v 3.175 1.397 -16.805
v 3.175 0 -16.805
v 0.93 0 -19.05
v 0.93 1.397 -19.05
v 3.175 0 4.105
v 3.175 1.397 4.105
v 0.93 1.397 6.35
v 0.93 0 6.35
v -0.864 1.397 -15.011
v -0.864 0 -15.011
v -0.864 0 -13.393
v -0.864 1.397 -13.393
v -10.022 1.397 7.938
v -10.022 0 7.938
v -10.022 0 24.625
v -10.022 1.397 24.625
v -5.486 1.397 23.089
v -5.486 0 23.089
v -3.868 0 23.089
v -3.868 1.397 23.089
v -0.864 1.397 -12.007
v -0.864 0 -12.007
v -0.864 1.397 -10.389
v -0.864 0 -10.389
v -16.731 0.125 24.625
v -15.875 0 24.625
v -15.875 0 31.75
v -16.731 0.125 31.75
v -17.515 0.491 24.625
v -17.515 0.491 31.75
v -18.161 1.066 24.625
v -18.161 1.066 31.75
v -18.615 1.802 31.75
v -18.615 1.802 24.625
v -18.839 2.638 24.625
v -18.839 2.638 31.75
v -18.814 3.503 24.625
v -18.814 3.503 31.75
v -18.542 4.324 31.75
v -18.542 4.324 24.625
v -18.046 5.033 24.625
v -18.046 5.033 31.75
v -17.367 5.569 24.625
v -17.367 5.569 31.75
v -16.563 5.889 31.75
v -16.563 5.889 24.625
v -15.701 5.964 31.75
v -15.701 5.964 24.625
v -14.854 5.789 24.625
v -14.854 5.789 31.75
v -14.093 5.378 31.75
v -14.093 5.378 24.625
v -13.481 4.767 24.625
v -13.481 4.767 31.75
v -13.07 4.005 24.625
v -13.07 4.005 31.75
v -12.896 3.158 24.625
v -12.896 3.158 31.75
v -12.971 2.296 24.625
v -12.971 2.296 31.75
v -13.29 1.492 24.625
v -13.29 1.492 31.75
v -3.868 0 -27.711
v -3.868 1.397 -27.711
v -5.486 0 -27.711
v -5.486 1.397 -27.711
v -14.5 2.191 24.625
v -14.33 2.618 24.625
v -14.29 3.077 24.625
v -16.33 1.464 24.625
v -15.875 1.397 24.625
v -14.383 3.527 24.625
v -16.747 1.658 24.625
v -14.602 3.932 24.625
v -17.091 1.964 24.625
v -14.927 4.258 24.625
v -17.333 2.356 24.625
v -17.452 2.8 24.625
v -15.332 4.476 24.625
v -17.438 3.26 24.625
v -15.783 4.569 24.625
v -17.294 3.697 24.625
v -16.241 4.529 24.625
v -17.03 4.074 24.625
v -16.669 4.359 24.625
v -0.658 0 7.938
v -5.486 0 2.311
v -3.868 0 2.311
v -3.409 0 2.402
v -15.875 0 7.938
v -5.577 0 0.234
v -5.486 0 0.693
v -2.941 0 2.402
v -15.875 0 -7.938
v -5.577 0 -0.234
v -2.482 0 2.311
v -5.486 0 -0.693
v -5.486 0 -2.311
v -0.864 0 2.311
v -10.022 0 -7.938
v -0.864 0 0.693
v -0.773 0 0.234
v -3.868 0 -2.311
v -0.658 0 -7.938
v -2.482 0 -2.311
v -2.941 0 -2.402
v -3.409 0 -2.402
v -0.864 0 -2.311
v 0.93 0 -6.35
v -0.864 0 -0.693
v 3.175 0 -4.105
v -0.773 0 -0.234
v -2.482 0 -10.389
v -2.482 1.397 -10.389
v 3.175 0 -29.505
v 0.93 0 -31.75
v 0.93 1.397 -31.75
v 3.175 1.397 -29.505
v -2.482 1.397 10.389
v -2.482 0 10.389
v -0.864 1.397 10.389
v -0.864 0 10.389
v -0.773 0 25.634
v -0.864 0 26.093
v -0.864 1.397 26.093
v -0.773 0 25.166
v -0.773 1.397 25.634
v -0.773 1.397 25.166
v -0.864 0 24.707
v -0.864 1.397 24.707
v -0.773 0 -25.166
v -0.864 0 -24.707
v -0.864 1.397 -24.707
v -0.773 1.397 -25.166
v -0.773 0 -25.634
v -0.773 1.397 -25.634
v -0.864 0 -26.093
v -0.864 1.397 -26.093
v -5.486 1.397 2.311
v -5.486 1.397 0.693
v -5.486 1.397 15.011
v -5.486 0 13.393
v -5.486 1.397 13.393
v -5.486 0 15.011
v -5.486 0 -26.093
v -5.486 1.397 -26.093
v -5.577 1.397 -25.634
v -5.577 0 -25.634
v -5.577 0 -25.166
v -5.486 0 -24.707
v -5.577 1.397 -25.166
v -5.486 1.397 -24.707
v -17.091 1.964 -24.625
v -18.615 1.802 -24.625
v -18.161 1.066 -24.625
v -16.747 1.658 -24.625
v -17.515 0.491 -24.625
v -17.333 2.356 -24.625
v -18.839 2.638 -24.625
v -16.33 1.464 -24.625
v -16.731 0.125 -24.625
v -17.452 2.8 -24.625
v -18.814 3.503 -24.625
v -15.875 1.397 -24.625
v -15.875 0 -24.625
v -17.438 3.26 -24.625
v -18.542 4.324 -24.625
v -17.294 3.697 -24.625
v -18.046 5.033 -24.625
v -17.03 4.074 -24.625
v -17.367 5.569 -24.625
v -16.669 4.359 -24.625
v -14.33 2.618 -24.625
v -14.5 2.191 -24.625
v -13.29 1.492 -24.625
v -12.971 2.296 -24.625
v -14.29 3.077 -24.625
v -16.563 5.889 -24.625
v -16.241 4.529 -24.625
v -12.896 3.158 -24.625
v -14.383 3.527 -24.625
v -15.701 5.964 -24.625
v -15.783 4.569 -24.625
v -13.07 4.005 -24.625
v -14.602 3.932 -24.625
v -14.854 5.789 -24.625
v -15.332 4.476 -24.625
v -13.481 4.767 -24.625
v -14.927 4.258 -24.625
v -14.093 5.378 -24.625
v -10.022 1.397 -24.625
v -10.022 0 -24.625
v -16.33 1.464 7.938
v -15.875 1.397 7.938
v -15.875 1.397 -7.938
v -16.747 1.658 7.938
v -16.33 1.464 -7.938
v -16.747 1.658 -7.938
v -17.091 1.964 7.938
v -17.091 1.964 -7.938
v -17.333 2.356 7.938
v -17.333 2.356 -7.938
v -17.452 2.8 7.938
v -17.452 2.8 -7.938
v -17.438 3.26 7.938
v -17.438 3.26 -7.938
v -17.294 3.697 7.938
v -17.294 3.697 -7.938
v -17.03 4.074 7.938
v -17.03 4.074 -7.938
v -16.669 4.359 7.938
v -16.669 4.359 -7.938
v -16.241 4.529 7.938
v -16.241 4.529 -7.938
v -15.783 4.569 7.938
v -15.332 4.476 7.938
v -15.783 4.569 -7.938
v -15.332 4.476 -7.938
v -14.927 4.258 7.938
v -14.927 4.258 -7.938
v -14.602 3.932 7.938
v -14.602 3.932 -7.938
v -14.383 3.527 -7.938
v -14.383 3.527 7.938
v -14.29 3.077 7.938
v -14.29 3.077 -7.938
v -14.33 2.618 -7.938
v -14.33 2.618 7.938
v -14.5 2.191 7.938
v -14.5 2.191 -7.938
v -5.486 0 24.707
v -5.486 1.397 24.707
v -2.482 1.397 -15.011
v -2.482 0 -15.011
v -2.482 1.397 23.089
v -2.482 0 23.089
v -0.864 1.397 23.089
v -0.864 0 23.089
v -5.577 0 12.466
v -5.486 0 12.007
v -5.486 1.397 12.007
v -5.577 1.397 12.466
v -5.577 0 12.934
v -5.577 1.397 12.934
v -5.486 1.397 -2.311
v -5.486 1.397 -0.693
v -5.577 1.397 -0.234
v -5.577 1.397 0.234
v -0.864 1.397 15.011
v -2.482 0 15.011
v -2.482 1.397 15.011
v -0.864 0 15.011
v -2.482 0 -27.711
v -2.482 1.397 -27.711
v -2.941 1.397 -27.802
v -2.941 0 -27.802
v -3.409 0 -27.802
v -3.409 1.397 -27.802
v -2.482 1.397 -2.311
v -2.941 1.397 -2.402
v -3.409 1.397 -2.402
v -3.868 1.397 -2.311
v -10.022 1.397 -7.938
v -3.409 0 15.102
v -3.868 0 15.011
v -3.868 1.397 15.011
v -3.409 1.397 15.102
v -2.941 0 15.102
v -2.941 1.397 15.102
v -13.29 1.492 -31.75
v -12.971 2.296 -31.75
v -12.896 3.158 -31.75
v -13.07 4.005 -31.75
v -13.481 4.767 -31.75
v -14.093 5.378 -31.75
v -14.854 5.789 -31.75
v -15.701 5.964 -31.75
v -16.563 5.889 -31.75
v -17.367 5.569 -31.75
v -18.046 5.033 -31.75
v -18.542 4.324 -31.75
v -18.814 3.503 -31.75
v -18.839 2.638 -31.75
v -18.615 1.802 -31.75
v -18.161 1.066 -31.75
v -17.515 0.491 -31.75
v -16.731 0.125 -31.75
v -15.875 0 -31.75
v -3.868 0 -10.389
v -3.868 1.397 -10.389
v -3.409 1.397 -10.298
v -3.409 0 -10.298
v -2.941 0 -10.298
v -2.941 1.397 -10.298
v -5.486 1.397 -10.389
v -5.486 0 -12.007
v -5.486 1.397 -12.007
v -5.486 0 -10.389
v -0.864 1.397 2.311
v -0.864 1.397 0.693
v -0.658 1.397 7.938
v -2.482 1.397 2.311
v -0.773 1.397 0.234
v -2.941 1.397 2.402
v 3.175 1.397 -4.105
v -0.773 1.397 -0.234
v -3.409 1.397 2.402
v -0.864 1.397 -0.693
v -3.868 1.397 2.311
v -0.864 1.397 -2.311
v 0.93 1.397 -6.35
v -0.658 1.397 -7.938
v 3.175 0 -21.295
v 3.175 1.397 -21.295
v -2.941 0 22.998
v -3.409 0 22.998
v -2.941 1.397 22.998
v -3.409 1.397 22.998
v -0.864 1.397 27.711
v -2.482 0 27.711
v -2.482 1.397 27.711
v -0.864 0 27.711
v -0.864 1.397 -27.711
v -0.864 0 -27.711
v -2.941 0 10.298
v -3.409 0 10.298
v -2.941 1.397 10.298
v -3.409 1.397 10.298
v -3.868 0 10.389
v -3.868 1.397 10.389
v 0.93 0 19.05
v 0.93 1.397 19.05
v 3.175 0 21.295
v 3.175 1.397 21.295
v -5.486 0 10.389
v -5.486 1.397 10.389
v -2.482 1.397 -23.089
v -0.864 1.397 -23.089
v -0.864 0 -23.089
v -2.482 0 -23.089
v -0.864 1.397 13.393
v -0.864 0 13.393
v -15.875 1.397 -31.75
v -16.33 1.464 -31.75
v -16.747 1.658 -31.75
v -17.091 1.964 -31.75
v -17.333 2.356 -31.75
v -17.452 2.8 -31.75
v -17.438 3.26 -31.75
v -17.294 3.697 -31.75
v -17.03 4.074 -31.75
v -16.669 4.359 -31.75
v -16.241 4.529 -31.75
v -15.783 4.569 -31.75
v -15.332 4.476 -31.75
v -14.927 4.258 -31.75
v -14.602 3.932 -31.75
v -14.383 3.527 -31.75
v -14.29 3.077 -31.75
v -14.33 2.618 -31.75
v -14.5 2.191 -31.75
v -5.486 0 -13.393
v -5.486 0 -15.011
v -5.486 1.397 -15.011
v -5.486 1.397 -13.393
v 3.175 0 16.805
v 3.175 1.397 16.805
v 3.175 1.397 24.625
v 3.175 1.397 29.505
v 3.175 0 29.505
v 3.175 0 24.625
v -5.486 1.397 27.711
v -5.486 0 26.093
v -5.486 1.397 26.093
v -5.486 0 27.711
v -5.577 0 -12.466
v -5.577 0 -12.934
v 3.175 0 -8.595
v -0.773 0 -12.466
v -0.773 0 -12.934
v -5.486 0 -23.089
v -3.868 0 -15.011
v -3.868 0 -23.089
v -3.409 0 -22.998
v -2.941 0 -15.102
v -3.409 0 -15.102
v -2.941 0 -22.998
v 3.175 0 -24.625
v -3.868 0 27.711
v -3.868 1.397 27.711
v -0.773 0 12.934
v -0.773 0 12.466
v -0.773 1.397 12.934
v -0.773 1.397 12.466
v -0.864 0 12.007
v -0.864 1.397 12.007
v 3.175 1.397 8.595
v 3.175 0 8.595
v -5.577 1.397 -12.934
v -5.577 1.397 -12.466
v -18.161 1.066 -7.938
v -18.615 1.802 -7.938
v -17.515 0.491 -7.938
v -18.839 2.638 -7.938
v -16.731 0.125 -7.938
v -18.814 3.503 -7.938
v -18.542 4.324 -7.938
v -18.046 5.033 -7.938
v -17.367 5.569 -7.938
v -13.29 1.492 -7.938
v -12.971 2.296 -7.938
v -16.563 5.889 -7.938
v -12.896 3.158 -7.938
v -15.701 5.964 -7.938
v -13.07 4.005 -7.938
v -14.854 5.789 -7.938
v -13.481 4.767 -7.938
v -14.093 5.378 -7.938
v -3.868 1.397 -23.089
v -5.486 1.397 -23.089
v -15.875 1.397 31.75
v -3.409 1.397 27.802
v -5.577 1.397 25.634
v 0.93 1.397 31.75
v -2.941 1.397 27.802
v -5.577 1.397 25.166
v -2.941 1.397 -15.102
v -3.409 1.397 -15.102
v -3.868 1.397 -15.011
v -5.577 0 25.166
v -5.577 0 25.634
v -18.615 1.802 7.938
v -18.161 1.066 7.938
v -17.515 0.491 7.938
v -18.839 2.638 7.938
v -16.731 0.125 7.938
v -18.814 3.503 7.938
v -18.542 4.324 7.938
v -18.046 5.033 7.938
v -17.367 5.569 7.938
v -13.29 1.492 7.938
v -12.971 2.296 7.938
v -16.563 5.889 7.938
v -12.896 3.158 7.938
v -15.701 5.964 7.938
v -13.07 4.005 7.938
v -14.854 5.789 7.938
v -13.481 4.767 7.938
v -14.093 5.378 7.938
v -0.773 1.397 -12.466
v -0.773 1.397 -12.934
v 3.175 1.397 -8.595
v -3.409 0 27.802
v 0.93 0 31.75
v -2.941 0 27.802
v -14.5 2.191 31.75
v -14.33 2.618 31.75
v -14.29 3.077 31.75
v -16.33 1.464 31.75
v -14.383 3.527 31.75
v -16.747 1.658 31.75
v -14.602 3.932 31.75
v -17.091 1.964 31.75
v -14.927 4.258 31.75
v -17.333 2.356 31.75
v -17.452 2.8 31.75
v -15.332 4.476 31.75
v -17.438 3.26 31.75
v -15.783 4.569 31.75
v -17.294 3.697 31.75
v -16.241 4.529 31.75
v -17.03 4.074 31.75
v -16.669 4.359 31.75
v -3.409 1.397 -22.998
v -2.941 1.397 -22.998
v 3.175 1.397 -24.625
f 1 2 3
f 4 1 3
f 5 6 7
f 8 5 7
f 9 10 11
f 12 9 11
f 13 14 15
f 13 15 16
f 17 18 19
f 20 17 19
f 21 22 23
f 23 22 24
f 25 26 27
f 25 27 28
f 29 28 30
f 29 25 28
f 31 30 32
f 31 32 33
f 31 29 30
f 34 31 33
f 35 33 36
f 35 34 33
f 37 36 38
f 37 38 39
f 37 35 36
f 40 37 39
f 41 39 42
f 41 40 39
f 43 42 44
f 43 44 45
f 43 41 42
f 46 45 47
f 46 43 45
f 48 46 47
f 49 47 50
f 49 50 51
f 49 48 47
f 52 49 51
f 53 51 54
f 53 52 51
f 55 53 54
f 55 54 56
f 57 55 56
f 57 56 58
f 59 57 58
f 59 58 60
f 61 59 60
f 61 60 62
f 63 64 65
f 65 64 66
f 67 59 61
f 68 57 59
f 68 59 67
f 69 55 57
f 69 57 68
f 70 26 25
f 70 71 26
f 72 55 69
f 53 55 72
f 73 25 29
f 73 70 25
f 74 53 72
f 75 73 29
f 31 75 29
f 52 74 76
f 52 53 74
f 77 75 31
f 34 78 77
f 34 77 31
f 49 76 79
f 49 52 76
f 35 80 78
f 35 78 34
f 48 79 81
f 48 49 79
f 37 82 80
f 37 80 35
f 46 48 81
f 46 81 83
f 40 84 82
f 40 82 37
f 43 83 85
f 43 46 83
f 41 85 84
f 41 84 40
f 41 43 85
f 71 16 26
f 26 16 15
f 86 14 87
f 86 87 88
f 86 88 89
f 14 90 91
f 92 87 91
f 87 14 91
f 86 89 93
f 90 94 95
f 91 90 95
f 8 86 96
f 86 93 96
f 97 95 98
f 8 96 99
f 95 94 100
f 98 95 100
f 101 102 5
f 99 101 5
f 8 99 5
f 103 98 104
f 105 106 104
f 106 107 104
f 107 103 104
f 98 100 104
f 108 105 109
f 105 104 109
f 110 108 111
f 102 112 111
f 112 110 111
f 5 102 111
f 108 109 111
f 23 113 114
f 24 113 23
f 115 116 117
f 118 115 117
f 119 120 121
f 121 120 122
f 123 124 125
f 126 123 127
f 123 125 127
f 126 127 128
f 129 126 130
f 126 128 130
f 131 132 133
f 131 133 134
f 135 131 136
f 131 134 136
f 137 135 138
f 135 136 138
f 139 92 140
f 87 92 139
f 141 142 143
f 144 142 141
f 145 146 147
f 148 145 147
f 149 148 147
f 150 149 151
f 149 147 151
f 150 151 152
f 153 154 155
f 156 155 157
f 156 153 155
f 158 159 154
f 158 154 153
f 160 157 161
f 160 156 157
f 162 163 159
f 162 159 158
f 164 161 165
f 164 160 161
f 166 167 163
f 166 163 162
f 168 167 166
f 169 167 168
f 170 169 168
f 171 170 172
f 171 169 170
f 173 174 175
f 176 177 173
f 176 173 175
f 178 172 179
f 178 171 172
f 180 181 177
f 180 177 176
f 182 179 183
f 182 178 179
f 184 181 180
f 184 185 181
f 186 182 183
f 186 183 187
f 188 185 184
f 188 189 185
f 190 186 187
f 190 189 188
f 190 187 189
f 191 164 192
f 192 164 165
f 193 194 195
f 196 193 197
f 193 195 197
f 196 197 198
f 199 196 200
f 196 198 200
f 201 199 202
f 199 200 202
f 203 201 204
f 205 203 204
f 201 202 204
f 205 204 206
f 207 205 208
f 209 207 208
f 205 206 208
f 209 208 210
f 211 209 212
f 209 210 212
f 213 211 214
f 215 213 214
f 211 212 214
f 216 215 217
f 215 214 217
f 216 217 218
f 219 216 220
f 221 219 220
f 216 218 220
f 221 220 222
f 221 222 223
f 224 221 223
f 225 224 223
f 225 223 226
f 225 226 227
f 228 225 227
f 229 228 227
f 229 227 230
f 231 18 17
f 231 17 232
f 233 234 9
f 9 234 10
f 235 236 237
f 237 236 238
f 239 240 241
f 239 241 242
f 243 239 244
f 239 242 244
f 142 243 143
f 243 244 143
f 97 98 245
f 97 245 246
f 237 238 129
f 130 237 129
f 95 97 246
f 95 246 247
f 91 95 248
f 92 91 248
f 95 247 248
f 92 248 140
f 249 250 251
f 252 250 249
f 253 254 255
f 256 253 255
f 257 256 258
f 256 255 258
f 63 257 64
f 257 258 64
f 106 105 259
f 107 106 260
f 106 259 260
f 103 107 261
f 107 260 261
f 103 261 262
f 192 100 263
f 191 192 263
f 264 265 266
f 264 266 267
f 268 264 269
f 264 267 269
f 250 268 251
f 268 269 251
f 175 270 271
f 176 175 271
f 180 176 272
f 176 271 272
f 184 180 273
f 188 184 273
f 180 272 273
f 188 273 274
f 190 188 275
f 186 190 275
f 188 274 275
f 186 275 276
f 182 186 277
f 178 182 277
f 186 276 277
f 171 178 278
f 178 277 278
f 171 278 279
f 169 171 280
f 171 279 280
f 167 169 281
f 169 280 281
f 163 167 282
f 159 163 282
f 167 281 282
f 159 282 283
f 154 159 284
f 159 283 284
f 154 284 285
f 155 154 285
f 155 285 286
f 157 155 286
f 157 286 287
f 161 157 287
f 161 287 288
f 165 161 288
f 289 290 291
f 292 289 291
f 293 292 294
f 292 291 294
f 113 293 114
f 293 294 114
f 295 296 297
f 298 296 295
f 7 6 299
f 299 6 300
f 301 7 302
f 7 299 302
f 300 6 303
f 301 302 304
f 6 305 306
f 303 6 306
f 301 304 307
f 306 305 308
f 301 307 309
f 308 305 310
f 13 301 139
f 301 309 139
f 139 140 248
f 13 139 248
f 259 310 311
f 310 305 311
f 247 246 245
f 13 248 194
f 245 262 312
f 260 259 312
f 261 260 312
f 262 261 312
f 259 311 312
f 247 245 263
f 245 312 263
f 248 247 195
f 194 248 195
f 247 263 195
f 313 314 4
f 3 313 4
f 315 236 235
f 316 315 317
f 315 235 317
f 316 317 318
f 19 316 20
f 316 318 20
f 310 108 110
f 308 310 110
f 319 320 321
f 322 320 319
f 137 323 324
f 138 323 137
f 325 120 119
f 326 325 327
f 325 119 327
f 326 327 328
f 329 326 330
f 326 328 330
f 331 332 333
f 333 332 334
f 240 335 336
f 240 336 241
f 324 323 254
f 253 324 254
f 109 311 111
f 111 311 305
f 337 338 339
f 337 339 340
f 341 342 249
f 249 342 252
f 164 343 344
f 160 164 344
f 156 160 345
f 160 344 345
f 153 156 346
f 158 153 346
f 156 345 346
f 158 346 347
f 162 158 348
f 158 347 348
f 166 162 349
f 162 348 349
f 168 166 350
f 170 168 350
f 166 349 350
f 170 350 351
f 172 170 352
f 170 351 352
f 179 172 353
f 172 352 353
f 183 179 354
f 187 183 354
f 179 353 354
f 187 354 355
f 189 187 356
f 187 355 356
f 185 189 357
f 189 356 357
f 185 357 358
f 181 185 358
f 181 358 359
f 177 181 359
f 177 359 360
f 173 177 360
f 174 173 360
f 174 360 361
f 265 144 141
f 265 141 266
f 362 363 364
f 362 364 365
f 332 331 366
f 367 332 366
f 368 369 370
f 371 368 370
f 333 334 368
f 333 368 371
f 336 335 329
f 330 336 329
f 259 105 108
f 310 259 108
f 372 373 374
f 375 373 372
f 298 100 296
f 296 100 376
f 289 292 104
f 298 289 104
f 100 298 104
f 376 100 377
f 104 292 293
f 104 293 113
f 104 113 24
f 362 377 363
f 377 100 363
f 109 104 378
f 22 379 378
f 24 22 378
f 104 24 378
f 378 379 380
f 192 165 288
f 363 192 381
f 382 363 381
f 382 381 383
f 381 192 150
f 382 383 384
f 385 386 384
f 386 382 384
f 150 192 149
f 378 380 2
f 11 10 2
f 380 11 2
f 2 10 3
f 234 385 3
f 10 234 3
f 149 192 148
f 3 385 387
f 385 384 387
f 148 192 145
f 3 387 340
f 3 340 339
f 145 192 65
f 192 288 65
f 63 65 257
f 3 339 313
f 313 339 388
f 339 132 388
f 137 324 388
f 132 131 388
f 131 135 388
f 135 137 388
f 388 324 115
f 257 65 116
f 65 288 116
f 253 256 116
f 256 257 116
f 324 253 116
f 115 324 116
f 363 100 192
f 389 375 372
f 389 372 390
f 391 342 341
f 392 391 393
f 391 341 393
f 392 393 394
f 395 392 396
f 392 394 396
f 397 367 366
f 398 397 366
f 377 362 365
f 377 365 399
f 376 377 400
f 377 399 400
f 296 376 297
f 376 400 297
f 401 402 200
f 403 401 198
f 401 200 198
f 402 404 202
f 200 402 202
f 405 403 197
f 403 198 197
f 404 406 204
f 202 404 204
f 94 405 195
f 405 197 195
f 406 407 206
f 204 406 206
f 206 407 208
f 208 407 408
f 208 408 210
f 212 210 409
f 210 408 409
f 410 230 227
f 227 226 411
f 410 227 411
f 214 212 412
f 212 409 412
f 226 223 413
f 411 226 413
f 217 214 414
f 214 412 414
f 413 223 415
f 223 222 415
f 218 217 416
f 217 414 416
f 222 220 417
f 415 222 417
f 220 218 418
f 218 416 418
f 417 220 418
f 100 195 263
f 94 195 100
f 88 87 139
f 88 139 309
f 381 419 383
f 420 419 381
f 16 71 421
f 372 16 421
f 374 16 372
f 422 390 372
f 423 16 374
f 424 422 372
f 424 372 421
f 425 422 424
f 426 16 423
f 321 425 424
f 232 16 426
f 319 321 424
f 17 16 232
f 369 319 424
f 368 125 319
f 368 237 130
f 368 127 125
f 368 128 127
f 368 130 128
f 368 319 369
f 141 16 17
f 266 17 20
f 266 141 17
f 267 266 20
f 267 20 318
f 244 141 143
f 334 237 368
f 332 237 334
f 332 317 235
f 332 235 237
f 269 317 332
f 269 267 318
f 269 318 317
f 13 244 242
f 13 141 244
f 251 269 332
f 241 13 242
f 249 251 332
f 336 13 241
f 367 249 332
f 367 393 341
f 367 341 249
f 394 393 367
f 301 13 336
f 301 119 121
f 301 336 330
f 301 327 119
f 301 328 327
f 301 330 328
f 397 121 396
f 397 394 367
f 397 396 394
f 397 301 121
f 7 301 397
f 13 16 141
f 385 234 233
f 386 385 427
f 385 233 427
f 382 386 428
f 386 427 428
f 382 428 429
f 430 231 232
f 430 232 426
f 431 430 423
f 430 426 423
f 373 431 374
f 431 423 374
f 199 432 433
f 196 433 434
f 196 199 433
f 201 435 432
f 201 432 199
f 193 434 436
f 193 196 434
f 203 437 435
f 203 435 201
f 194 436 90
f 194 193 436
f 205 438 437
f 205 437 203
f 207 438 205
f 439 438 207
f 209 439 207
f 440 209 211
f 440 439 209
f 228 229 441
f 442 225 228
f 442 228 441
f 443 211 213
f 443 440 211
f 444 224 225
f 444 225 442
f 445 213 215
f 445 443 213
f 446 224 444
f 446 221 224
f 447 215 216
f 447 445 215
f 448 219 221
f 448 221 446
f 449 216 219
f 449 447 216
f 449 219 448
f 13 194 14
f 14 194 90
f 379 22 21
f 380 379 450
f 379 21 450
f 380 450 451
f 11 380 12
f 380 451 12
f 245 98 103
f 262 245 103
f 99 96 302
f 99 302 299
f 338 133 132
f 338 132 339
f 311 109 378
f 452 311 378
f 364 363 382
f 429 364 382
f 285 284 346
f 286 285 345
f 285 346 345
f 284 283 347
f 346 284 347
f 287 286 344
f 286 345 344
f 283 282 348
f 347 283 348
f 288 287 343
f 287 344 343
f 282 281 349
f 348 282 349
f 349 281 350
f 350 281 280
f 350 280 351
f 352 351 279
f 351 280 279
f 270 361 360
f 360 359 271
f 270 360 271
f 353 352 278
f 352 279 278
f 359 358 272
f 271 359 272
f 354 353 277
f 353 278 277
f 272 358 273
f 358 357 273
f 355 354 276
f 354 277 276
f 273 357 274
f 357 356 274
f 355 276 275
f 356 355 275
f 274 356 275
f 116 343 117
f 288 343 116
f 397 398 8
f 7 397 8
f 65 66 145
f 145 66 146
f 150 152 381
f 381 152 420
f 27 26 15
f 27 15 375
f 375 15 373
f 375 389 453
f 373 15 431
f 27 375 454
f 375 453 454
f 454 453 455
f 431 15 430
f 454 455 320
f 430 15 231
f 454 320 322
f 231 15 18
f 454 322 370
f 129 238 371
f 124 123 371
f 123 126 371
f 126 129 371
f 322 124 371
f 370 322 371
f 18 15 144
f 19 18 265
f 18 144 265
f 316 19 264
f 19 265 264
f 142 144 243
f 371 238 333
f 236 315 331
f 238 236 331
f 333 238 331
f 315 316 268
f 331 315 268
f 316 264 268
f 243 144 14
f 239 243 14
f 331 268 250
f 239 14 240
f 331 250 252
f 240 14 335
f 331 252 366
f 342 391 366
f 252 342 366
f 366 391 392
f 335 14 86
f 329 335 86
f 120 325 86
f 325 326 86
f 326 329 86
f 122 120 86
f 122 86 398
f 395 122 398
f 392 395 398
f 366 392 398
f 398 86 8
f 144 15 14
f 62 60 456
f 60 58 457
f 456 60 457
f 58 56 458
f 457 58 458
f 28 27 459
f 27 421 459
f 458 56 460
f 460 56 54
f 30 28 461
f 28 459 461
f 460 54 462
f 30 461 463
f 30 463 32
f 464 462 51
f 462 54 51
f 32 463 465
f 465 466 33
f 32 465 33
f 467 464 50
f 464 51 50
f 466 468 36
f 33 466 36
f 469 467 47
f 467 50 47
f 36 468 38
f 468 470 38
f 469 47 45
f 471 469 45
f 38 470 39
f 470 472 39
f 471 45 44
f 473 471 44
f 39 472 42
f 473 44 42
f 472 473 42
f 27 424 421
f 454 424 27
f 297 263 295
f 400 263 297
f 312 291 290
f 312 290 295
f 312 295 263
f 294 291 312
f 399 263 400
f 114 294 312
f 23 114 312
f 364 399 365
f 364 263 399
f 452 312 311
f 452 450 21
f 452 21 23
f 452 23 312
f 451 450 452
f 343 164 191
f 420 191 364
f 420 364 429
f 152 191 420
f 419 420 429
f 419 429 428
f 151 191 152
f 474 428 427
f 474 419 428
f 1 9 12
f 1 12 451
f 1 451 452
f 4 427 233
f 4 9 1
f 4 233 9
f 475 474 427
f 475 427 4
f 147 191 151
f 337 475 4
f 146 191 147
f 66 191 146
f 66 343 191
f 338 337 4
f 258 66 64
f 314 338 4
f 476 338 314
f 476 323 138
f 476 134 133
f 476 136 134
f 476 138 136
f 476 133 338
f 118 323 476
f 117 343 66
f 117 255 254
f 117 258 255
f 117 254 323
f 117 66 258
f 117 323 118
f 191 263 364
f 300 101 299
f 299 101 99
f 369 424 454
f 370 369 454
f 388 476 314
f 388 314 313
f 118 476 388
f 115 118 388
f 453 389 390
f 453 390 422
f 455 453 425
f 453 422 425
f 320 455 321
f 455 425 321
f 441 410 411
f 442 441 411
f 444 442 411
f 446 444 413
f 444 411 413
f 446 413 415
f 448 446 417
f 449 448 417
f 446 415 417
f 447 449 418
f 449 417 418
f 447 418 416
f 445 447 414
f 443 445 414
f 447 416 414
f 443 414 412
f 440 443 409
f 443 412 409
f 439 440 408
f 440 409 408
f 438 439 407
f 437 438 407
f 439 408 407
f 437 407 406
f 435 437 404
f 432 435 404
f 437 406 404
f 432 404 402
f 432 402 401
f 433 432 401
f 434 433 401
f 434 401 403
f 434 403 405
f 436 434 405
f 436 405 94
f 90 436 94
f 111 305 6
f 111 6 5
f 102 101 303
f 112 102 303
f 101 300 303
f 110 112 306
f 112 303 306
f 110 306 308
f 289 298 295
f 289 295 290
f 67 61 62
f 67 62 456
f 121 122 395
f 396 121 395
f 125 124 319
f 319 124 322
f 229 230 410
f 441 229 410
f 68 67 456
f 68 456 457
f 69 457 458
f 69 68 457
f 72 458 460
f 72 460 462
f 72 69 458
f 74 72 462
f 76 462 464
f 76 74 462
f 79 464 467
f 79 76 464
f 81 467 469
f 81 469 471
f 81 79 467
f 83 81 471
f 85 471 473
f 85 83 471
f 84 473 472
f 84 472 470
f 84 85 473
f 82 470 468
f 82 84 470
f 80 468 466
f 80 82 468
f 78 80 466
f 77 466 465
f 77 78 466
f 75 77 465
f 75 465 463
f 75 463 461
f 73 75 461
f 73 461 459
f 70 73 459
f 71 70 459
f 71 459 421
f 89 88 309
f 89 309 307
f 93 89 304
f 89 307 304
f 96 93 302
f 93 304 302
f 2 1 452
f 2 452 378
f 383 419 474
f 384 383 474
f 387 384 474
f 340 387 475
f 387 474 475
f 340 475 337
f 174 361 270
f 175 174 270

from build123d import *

# Parameters (mm, degrees)
BOSS_EXTRUDE1_START       = -15.875
BOSS_EXTRUDE1_DEPTH       = 15.875
BOSS_EXTRUDE1_2_OUTLINE_W = 13.197490677
BOSS_EXTRUDE1_2_OUTLINE_H = 1.397
BOSS_EXTRUDE1_2_DEPTH     = 16.6878
SKETCH2_W                 = 13.197490677
SKETCH2_H                 = 1.397
BOSS_EXTRUDE2_DEPTH       = 16.6878
BOSS_EXTRUDE3_START       = 7.1247
BOSS_EXTRUDE3_DEPTH       = 7.1247
BOSS_EXTRUDE4_DEPTH       = 7.1247
CUT_EXTRUDE1_DEPTH        = 38.210837465
CUT_EXTRUDE2_DEPTH        = 38.210837465
CUT_EXTRUDE3_DEPTH        = 38.210837465
CUT_EXTRUDE4_DEPTH        = 38.210837465
SKETCH9_W                 = 4.6228
SKETCH9_H                 = 4.6228
CUT_EXTRUDE5_DEPTH        = 38.408183622
SKETCH10_W                = 4.6228
SKETCH10_H                = 4.6228
CUT_EXTRUDE6_DEPTH        = 38.408183622
SKETCH11_W                = 4.6228
SKETCH11_H                = 4.6228
CUT_EXTRUDE7_DEPTH        = 38.408183622
SKETCH12_W                = 4.6228
SKETCH12_H                = 4.6228
CUT_EXTRUDE8_DEPTH        = 38.408183622
SKETCH13_W                = 4.6228
SKETCH13_H                = 4.6228
CUT_EXTRUDE9_DEPTH        = 38.210837465
DRAFT1_DEPTH              = 1.397
DRAFT2_DEPTH              = 1.397
CHAMFER1_SIZE             = 2.24506403
SKETCH14_R                = 2.413
CUT_EXTRUDE10_DEPTH       = 2.54
LPATTERN1_COUNT           = 5
LPATTERN1_PITCH           = 12.7


with BuildPart() as part:
    # Boss-Extrude1: read off the stored shape, not the designer's step
    # Boss-Extrude1 outline → Boss-Extrude1 (new body)
    with BuildSketch(Plane.XY.offset(7.9375).offset(BOSS_EXTRUDE1_START)):
        with BuildLine():
            Line((-14.500184662, 2.190749994), (-13.290347173, 1.492249994))
            ThreePointArc((-13.290347173, 1.492249994), (-17.367250005, 5.569152828), (-15.875, -1.1e-08))
            Line((-15.875, -1.1e-08), (3.175, 0))
            Line((3.175, 0), (3.175, 1.397))
            Line((3.175, 1.397), (-15.875, 1.396999989))
            ThreePointArc((-15.875, 1.396999989), (-16.668750005, 4.359315339), (-14.500184662, 2.190749994))
        make_face()
    extrude(amount=BOSS_EXTRUDE1_DEPTH)

    # Boss-Extrude1 2 outline → Boss-Extrude1 2 (add)
    with BuildSketch(Plane.XY.offset(7.9375)):
        with Locations((-3.423745338, 0.6985)):
            Rectangle(BOSS_EXTRUDE1_2_OUTLINE_W, BOSS_EXTRUDE1_2_OUTLINE_H)
    extrude(amount=BOSS_EXTRUDE1_2_DEPTH)

    # Sketch2 → Boss-Extrude2 (add)
    with BuildSketch(Plane(origin=(0, 0, -7.9375), x_dir=(-1, 0, 0), z_dir=(0, 0, -1))):
        with Locations((3.423745338, 0.6985)):
            Rectangle(SKETCH2_W, SKETCH2_H)
    extrude(amount=BOSS_EXTRUDE2_DEPTH)

    # Sketch3 → Boss-Extrude3 (add)
    with BuildSketch(Plane(origin=(0, 0, -24.6253), x_dir=(-1, 0, 0), z_dir=(0, 0, -1)).offset(BOSS_EXTRUDE3_START)):
        with BuildLine():
            Line((15.875, 0), (-3.175, 0))
            Line((-3.175, 0), (-3.175, 1.397))
            Line((-3.175, 1.397), (15.875, 1.397))
            ThreePointArc((15.875, 1.397), (16.668750004, 4.359315344), (14.500184664, 2.190750004))
            Line((14.500184664, 2.190750004), (13.290347175, 1.492250004))
            ThreePointArc((13.290347175, 1.492250004), (17.367250004, 5.569152833), (15.875, 0))
        make_face()
    extrude(amount=-BOSS_EXTRUDE3_DEPTH)

    # Sketch4 → Boss-Extrude4 (add)
    with BuildSketch(Plane.XY.offset(24.6253)):
        with BuildLine():
            Line((-15.875, 1.396999994), (3.175, 1.396999994))
            Line((3.175, 1.396999994), (3.175, -6e-09))
            Line((3.175, -6e-09), (-15.875, -6e-09))
            ThreePointArc((-15.875, -6e-09), (-17.367250004, 5.569152828), (-13.290347175, 1.492249999))
            Line((-13.290347175, 1.492249999), (-14.500184664, 2.190749999))
            ThreePointArc((-14.500184664, 2.190749999), (-16.668750004, 4.359315339), (-15.875, 1.396999994))
        make_face()
    extrude(amount=BOSS_EXTRUDE4_DEPTH)

    # Sketch5 → Cut-Extrude1 (cut, through all)
    with BuildSketch(Plane(origin=(0, 1.397, 0), x_dir=(-1, 0, 0), z_dir=(0, 1, 0))):
        Polygon((-3.175, -16.80493597), (-3.175, -21.29506403), (1.315128061, -16.80493597), align=None)
    extrude(amount=-CUT_EXTRUDE1_DEPTH, mode=Mode.SUBTRACT)

    # Sketch6 → Cut-Extrude2 (cut, through all)
    with BuildSketch(Plane(origin=(0, 1.397, 0), x_dir=(-1, 0, 0), z_dir=(0, 1, 0))):
        Polygon((-3.175, -4.10493597), (-3.175, -8.59506403), (1.315128061, -8.59506403), align=None)
    extrude(amount=-CUT_EXTRUDE2_DEPTH, mode=Mode.SUBTRACT)

    # Sketch7 → Cut-Extrude3 (cut, through all)
    with BuildSketch(Plane(origin=(0, 1.397, 0), x_dir=(-1, 0, 0), z_dir=(0, 1, 0))):
        Polygon((-3.175, 8.59506403), (-3.175, 4.10493597), (1.315128061, 8.59506403), align=None)
    extrude(amount=-CUT_EXTRUDE3_DEPTH, mode=Mode.SUBTRACT)

    # Sketch8 → Cut-Extrude4 (cut, through all)
    with BuildSketch(Plane(origin=(0, 1.397, 0), x_dir=(-1, 0, 0), z_dir=(0, 1, 0))):
        Polygon((-3.175, 21.29506403), (-3.175, 16.80493597), (1.315128061, 16.80493597), align=None)
    extrude(amount=-CUT_EXTRUDE4_DEPTH, mode=Mode.SUBTRACT)

    # Sketch9 → Cut-Extrude5 (cut, through all)
    with BuildSketch(Plane.XZ):
        with Locations((-3.175, 25.4)):
            Rectangle(SKETCH9_W, SKETCH9_H)
    extrude(amount=-CUT_EXTRUDE5_DEPTH, mode=Mode.SUBTRACT)

    # Sketch10 → Cut-Extrude6 (cut, through all)
    with BuildSketch(Plane.XZ):
        with Locations((-3.175, 12.7)):
            Rectangle(SKETCH10_W, SKETCH10_H)
    extrude(amount=-CUT_EXTRUDE6_DEPTH, mode=Mode.SUBTRACT)

    # Sketch11 → Cut-Extrude7 (cut, through all)
    with BuildSketch(Plane.XZ):
        with Locations((-3.175, 0)):
            Rectangle(SKETCH11_W, SKETCH11_H)
    extrude(amount=-CUT_EXTRUDE7_DEPTH, mode=Mode.SUBTRACT)

    # Sketch12 → Cut-Extrude8 (cut, through all)
    with BuildSketch(Plane.XZ):
        with Locations((-3.175, -12.7)):
            Rectangle(SKETCH12_W, SKETCH12_H)
    extrude(amount=-CUT_EXTRUDE8_DEPTH, mode=Mode.SUBTRACT)

    # Sketch13 → Cut-Extrude9 (cut, through all)
    with BuildSketch(Plane(origin=(0, 1.397, 0), x_dir=(-1, 0, 0), z_dir=(0, 1, 0))):
        with Locations((3.175, -25.4)):
            Rectangle(SKETCH13_W, SKETCH13_H)
    extrude(amount=-CUT_EXTRUDE9_DEPTH, mode=Mode.SUBTRACT)

    # Draft1: read off the stored shape, not the designer's step
    # Draft1 outline → Draft1 (add)
    with BuildSketch(Plane(origin=(0, 0, 0), x_dir=(1, 0, 0), z_dir=(0, 1, 0))):
        Polygon((-1.315128061, 16.80493597), (3.175, 16.80493597), (0.92993597, 19.05), align=None)
        Polygon((-1.315128061, 8.59506403), (0.92993597, 6.35), (3.175, 8.59506403), align=None)
    extrude(amount=DRAFT1_DEPTH)

    # Draft2: read off the stored shape, not the designer's step
    # Draft2 outline → Draft2 (add)
    with BuildSketch(Plane(origin=(0, 0, 0), x_dir=(1, 0, 0), z_dir=(0, 1, 0))):
        Polygon((-1.315128061, -8.59506403), (3.175, -8.59506403), (0.92993597, -6.35), align=None)
        Polygon((-1.315128061, -16.80493597), (0.92993597, -19.05), (3.175, -16.80493597), align=None)
    extrude(amount=DRAFT2_DEPTH)

    # Chamfer1
    chamfer1_edges = [part.edges().sort_by_distance(p)[0] for p in [
        (3.175, 0.6985, -31.75),
        (3.175, 0.698499994, 31.75),
    ]]
    chamfer(chamfer1_edges, length=CHAMFER1_SIZE)

    # Sketch14 → Cut-Extrude10 (cut)
    with BuildSketch(Plane(origin=(0, 1.397, 0), x_dir=(1, 0, 0), z_dir=(0, 1, 0))):
        with Locations((-3.175, -25.4)):
            Circle(SKETCH14_R)
    cut_extrude10 = extrude(amount=-CUT_EXTRUDE10_DEPTH, mode=Mode.SUBTRACT)

    # LPattern1: Cut-Extrude10 ×5
    with Locations(*[(0, 0, -i * LPATTERN1_PITCH) for i in range(1, LPATTERN1_COUNT)]):
        add(cut_extrude10, mode=Mode.SUBTRACT)


solid = part.part
